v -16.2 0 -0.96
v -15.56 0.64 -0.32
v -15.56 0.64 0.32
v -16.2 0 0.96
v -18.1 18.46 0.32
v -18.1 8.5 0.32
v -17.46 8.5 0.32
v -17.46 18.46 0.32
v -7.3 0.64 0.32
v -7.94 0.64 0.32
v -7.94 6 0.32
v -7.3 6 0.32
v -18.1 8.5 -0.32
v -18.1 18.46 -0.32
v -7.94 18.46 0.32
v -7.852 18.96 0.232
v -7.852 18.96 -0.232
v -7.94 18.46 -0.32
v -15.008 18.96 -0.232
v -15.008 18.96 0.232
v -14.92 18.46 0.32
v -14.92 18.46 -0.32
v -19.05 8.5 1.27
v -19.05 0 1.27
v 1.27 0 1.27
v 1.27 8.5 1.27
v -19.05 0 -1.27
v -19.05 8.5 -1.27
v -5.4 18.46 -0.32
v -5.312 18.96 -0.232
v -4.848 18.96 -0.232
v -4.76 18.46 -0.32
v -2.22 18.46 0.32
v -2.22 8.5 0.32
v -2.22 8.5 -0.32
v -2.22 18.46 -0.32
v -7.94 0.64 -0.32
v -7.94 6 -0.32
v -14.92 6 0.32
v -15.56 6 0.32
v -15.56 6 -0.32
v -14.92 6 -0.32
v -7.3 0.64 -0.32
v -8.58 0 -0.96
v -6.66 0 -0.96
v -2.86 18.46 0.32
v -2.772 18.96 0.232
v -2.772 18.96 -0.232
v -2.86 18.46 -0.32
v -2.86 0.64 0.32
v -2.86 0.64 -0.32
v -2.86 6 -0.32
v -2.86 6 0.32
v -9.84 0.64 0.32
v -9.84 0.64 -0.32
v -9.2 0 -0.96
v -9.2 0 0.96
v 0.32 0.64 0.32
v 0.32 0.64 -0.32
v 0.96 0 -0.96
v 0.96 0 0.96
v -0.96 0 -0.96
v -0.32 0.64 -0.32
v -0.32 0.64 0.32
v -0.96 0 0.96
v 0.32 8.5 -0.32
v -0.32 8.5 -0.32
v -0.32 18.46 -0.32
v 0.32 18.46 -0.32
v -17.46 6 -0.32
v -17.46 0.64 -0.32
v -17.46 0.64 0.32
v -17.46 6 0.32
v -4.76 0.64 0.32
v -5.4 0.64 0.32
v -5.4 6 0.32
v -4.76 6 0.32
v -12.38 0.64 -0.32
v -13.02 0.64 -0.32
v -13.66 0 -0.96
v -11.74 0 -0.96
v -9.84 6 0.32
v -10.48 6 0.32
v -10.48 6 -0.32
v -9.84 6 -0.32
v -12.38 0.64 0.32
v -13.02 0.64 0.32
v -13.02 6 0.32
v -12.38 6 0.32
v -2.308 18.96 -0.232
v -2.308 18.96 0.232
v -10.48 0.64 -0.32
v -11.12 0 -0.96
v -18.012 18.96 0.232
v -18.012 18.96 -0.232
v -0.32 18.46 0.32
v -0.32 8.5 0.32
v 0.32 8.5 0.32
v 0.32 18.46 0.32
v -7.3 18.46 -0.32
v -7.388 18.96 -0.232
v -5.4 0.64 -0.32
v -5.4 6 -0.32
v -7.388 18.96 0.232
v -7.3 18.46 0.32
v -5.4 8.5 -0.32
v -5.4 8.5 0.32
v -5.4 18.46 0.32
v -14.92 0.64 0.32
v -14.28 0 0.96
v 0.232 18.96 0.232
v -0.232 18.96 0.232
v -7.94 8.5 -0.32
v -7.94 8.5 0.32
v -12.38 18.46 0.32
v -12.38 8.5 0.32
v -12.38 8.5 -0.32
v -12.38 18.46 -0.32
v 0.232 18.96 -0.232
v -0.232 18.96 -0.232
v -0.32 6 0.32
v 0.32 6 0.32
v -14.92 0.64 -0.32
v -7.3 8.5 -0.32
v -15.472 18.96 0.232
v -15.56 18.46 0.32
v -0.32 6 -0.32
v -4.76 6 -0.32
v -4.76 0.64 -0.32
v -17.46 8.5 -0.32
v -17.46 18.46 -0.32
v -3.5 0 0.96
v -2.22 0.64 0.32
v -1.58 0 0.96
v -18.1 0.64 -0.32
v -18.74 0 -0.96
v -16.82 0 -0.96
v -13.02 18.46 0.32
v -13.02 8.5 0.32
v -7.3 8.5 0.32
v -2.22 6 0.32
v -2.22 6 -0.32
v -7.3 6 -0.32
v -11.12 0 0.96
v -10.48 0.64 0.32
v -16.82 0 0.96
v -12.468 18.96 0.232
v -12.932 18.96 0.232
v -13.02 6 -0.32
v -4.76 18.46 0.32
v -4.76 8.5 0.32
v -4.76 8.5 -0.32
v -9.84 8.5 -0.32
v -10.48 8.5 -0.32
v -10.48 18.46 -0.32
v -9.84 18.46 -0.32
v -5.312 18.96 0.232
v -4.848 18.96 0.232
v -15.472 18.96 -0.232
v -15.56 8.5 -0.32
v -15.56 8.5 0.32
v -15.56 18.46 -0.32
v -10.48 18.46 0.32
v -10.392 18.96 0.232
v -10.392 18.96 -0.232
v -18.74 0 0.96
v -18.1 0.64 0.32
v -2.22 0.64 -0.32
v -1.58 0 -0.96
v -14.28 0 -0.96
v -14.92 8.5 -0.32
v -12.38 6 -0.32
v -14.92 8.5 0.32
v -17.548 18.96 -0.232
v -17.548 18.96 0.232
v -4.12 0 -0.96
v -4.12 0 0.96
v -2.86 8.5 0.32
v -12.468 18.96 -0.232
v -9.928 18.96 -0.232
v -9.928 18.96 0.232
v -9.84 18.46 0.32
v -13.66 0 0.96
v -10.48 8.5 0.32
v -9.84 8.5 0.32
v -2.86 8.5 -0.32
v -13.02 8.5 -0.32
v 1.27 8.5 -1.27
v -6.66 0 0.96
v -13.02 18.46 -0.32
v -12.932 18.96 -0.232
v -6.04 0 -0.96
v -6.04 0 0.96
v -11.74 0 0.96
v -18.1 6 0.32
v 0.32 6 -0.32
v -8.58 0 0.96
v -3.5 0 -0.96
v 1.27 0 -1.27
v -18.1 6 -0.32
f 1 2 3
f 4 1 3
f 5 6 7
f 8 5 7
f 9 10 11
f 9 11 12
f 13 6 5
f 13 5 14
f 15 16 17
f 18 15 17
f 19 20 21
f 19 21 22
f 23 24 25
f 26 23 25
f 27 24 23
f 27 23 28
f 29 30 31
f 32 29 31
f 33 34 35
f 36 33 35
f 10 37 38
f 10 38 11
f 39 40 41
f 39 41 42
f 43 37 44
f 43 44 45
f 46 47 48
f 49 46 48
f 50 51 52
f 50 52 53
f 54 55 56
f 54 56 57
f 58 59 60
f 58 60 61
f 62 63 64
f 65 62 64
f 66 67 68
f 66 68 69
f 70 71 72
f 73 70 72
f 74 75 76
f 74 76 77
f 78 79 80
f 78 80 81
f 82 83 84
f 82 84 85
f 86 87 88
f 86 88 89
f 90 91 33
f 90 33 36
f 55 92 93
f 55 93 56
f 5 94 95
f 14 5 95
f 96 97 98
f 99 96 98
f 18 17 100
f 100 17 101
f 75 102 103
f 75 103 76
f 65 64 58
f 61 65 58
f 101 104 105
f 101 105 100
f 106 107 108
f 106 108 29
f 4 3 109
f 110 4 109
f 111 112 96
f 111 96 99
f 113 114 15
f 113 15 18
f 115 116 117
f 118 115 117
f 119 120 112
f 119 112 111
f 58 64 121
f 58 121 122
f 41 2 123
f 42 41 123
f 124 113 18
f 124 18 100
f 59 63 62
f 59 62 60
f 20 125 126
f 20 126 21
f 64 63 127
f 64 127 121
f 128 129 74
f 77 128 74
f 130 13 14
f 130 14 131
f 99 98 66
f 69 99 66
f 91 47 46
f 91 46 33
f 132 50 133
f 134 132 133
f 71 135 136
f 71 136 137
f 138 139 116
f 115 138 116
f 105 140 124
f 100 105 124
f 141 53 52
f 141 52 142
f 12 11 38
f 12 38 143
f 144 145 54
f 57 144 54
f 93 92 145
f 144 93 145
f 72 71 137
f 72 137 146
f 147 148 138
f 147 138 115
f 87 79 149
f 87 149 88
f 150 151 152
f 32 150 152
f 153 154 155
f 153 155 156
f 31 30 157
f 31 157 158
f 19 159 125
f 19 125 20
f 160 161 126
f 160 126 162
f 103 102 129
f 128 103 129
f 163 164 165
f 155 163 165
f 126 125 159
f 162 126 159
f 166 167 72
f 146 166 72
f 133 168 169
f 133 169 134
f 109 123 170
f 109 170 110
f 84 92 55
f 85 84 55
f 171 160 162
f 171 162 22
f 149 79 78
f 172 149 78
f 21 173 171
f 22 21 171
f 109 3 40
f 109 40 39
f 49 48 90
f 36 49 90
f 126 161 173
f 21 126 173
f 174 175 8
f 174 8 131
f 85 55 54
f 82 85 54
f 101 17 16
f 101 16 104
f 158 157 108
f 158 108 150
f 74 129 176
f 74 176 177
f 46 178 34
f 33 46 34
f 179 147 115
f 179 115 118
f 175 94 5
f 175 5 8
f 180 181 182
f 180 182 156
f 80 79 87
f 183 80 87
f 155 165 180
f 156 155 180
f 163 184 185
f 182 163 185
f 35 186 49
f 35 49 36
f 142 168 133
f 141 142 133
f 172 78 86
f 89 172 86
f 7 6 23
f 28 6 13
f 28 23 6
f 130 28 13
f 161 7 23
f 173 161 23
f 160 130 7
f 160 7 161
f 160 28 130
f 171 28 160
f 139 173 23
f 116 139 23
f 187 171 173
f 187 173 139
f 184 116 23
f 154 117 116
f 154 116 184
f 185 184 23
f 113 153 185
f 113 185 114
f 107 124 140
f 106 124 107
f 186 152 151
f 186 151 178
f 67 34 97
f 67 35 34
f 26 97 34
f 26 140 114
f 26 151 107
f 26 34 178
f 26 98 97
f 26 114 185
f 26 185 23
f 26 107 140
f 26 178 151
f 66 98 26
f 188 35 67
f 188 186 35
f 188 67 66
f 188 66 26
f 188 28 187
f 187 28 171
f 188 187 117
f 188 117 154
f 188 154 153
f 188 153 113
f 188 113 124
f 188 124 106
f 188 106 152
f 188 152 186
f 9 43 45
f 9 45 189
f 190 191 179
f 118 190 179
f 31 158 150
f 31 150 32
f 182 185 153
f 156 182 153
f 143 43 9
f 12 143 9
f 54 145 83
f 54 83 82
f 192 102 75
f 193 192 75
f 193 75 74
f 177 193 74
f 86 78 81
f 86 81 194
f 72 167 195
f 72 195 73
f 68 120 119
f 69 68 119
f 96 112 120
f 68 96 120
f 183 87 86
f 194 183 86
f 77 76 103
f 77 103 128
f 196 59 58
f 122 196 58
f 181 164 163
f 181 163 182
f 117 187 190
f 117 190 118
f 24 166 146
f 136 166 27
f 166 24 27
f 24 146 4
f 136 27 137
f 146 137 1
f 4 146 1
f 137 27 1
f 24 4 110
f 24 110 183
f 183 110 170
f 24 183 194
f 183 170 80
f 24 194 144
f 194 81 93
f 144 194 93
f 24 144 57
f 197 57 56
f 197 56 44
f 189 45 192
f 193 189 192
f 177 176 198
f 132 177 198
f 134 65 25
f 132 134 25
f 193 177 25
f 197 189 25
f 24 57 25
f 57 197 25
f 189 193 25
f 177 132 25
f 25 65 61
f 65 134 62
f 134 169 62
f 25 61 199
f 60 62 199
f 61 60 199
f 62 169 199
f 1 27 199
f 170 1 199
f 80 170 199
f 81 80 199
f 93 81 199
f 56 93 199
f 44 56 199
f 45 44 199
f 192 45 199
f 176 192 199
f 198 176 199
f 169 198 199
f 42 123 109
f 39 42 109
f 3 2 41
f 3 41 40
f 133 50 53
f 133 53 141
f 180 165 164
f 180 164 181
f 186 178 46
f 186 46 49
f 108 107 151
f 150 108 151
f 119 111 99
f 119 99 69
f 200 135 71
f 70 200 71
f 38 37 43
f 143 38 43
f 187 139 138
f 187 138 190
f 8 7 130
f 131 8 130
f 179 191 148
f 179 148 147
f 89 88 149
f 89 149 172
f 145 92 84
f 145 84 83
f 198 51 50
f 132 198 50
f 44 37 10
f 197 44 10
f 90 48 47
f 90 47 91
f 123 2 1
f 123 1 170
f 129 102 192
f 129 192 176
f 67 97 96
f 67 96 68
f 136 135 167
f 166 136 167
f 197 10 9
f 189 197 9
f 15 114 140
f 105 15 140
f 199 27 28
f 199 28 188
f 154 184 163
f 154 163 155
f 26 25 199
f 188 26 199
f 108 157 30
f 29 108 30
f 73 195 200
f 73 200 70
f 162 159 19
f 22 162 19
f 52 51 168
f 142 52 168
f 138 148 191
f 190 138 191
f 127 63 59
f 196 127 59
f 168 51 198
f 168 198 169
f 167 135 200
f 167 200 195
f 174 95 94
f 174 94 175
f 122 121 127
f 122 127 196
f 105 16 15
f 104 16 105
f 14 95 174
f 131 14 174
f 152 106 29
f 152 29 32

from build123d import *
from OCP.BRepFilletAPI import BRepFilletAPI_MakeChamfer

# Parameters (mm, degrees)
SKETCH1_W                   = 2.54
SKETCH1_H                   = 2.54
BOSS_EXTRUDE1_DEPTH         = 8.5
SKETCH2_W                   = 0.64
SKETCH2_H                   = 0.64
BOSS_EXTRUDE2_DEPTH         = 18.9595482
CHAMFER1_SIZE               = 0.5
CHAMFER1_SIZE2              = 0.08816349
SKETCH3_W                   = 0.64
SKETCH3_H                   = 0.64
CUT_EXTRUDE1_DEPTH          = 6
CHAMFER2_SIZE               = 0.64
LPATTERN1_COUNT             = 8
LPATTERN1_PITCH             = 2.54
CHAMFER1_OF_LPATTERN1_SIZE  = 0.5
CHAMFER1_OF_LPATTERN1_SIZE2 = 0.08816349
CHAMFER2_OF_LPATTERN1_SIZE  = 0.64


with BuildPart() as part:
    # Sketch1 → Boss-Extrude1 (new body)
    with BuildSketch(Plane(origin=(0, 0, 0), x_dir=(1, 0, 0), z_dir=(0, 1, 0))):
        Rectangle(SKETCH1_W, SKETCH1_H)
    boss_extrude1 = extrude(amount=BOSS_EXTRUDE1_DEPTH)

    # Sketch2 → Boss-Extrude2 (add)
    with BuildSketch(Plane(origin=(0, 0, 0), x_dir=(1, 0, 0), z_dir=(0, 1, 0))):
        Rectangle(SKETCH2_W, SKETCH2_H)
    boss_extrude2 = extrude(amount=BOSS_EXTRUDE2_DEPTH)

    # Chamfer1: one chamfer whose edges measure the first distance from different faces: ONE call of the kernel's chamfer builder (chamfer() names one face for all edges)
    chamfer1_edges_1 = [part.edges().sort_by_distance(p)[0] for p in [
        (-0.32, 18.9595482, 0),
    ]]
    chamfer1_side_1 = [part.faces().sort_by_distance(p)[0] for p in [
        (-0.32, 13.7297741, 0),
    ]]
    chamfer1_edges_2 = [part.edges().sort_by_distance(p)[0] for p in [
        (0, 18.9595482, 0.32),
    ]]
    chamfer1_side_2 = [part.faces().sort_by_distance(p)[0] for p in [
        (0, 13.7297741, 0.32),
    ]]
    chamfer1_edges_3 = [part.edges().sort_by_distance(p)[0] for p in [
        (0.32, 18.9595482, 0),
    ]]
    chamfer1_side_3 = [part.faces().sort_by_distance(p)[0] for p in [
        (0.32, 13.7297741, 0),
    ]]
    chamfer1_edges_4 = [part.edges().sort_by_distance(p)[0] for p in [
        (0, 18.9595482, -0.32),
    ]]
    chamfer1_side_4 = [part.faces().sort_by_distance(p)[0] for p in [
        (0, 13.7297741, -0.32),
    ]]
    chamfer1 = BRepFilletAPI_MakeChamfer(part.part.solid().wrapped)
    for e in chamfer1_edges_1:
        chamfer1.Add(CHAMFER1_SIZE, CHAMFER1_SIZE2, e.wrapped, chamfer1_side_1[0].wrapped)  # the first distance lies on this face
    for e in chamfer1_edges_2:
        chamfer1.Add(CHAMFER1_SIZE, CHAMFER1_SIZE2, e.wrapped, chamfer1_side_2[0].wrapped)  # the first distance lies on this face
    for e in chamfer1_edges_3:
        chamfer1.Add(CHAMFER1_SIZE, CHAMFER1_SIZE2, e.wrapped, chamfer1_side_3[0].wrapped)  # the first distance lies on this face
    for e in chamfer1_edges_4:
        chamfer1.Add(CHAMFER1_SIZE, CHAMFER1_SIZE2, e.wrapped, chamfer1_side_4[0].wrapped)  # the first distance lies on this face
    add(Compound.cast(chamfer1.Shape()), mode=Mode.REPLACE)

    # Sketch3 → Cut-Extrude1 (cut)
    with BuildSketch(Plane.XZ):
        Rectangle(SKETCH3_W, SKETCH3_H)
    cut_extrude1 = extrude(amount=-CUT_EXTRUDE1_DEPTH, mode=Mode.SUBTRACT)

    # Chamfer2
    chamfer2_edges = [part.edges().sort_by_distance(p)[0] for p in [
        (-0.32, 0, 0),
        (0, 0, -0.32),
        (0.32, 0, 0),
        (0, 0, 0.32),
    ]]
    chamfer(chamfer2_edges, length=CHAMFER2_SIZE)

    # LPattern1: Boss-Extrude1, Boss-Extrude2, Cut-Extrude1 ×8
    with Locations(*[(-i * LPATTERN1_PITCH, 0, 0) for i in range(1, LPATTERN1_COUNT)]):
        add(boss_extrude1)
        add(boss_extrude2)
        add(cut_extrude1, mode=Mode.SUBTRACT)

    # Chamfer1 of LPattern1: one chamfer whose edges measure the first distance from different faces: ONE call of the kernel's chamfer builder (chamfer() names one face for all edges)
    chamfer1_of_lpattern1_edges_1 = [part.edges().sort_by_distance(p)[0] for p in [
        (-2.86, 18.9595482, 0),
    ]]
    chamfer1_of_lpattern1_side_1 = [part.faces().sort_by_distance(p)[0] for p in [
        (-2.86, 13.7297741, 0),
    ]]
    chamfer1_of_lpattern1_edges_2 = [part.edges().sort_by_distance(p)[0] for p in [
        (-2.54, 18.9595482, 0.32),
    ]]
    chamfer1_of_lpattern1_side_2 = [part.faces().sort_by_distance(p)[0] for p in [
        (-2.54, 13.7297741, 0.32),
    ]]
    chamfer1_of_lpattern1_edges_3 = [part.edges().sort_by_distance(p)[0] for p in [
        (-2.22, 18.9595482, 0),
    ]]
    chamfer1_of_lpattern1_side_3 = [part.faces().sort_by_distance(p)[0] for p in [
        (-2.22, 13.7297741, 0),
    ]]
    chamfer1_of_lpattern1_edges_4 = [part.edges().sort_by_distance(p)[0] for p in [
        (-2.54, 18.9595482, -0.32),
    ]]
    chamfer1_of_lpattern1_side_4 = [part.faces().sort_by_distance(p)[0] for p in [
        (-2.54, 13.7297741, -0.32),
    ]]
    chamfer1_of_lpattern1_edges_5 = [part.edges().sort_by_distance(p)[0] for p in [
        (-5.4, 18.9595482, 0),
    ]]
    chamfer1_of_lpattern1_side_5 = [part.faces().sort_by_distance(p)[0] for p in [
        (-5.4, 13.7297741, 0),
    ]]
    chamfer1_of_lpattern1_edges_6 = [part.edges().sort_by_distance(p)[0] for p in [
        (-5.08, 18.9595482, 0.32),
    ]]
    chamfer1_of_lpattern1_side_6 = [part.faces().sort_by_distance(p)[0] for p in [
        (-5.08, 13.7297741, 0.32),
    ]]
    chamfer1_of_lpattern1_edges_7 = [part.edges().sort_by_distance(p)[0] for p in [
        (-4.76, 18.9595482, 0),
    ]]
    chamfer1_of_lpattern1_side_7 = [part.faces().sort_by_distance(p)[0] for p in [
        (-4.76, 13.7297741, 0),
    ]]
    chamfer1_of_lpattern1_edges_8 = [part.edges().sort_by_distance(p)[0] for p in [
        (-5.08, 18.9595482, -0.32),
    ]]
    chamfer1_of_lpattern1_side_8 = [part.faces().sort_by_distance(p)[0] for p in [
        (-5.08, 13.7297741, -0.32),
    ]]
    chamfer1_of_lpattern1_edges_9 = [part.edges().sort_by_distance(p)[0] for p in [
        (-7.94, 18.9595482, 0),
    ]]
    chamfer1_of_lpattern1_side_9 = [part.faces().sort_by_distance(p)[0] for p in [
        (-7.94, 13.7297741, 0),
    ]]
    chamfer1_of_lpattern1_edges_10 = [part.edges().sort_by_distance(p)[0] for p in [
        (-7.62, 18.9595482, 0.32),
    ]]
    chamfer1_of_lpattern1_side_10 = [part.faces().sort_by_distance(p)[0] for p in [
        (-7.62, 13.7297741, 0.32),
    ]]
    chamfer1_of_lpattern1_edges_11 = [part.edges().sort_by_distance(p)[0] for p in [
        (-7.3, 18.9595482, 0),
    ]]
    chamfer1_of_lpattern1_side_11 = [part.faces().sort_by_distance(p)[0] for p in [
        (-7.3, 13.7297741, 0),
    ]]
    chamfer1_of_lpattern1_edges_12 = [part.edges().sort_by_distance(p)[0] for p in [
        (-7.62, 18.9595482, -0.32),
    ]]
    chamfer1_of_lpattern1_side_12 = [part.faces().sort_by_distance(p)[0] for p in [
        (-7.62, 13.7297741, -0.32),
    ]]
    chamfer1_of_lpattern1_edges_13 = [part.edges().sort_by_distance(p)[0] for p in [
        (-10.48, 18.9595482, 0),
    ]]
    chamfer1_of_lpattern1_side_13 = [part.faces().sort_by_distance(p)[0] for p in [
        (-10.48, 13.7297741, 0),
    ]]
    chamfer1_of_lpattern1_edges_14 = [part.edges().sort_by_distance(p)[0] for p in [
        (-10.16, 18.9595482, 0.32),
    ]]
    chamfer1_of_lpattern1_side_14 = [part.faces().sort_by_distance(p)[0] for p in [
        (-10.16, 13.7297741, 0.32),
    ]]
    chamfer1_of_lpattern1_edges_15 = [part.edges().sort_by_distance(p)[0] for p in [
        (-9.84, 18.9595482, 0),
    ]]
    chamfer1_of_lpattern1_side_15 = [part.faces().sort_by_distance(p)[0] for p in [
        (-9.84, 13.7297741, 0),
    ]]
    chamfer1_of_lpattern1_edges_16 = [part.edges().sort_by_distance(p)[0] for p in [
        (-10.16, 18.9595482, -0.32),
    ]]
    chamfer1_of_lpattern1_side_16 = [part.faces().sort_by_distance(p)[0] for p in [
        (-10.16, 13.7297741, -0.32),
    ]]
    chamfer1_of_lpattern1_edges_17 = [part.edges().sort_by_distance(p)[0] for p in [
        (-13.02, 18.9595482, 0),
    ]]
    chamfer1_of_lpattern1_side_17 = [part.faces().sort_by_distance(p)[0] for p in [
        (-13.02, 13.7297741, 0),
    ]]
    chamfer1_of_lpattern1_edges_18 = [part.edges().sort_by_distance(p)[0] for p in [
        (-12.7, 18.9595482, 0.32),
    ]]
    chamfer1_of_lpattern1_side_18 = [part.faces().sort_by_distance(p)[0] for p in [
        (-12.7, 13.7297741, 0.32),
    ]]
    chamfer1_of_lpattern1_edges_19 = [part.edges().sort_by_distance(p)[0] for p in [
        (-12.38, 18.9595482, 0),
    ]]
    chamfer1_of_lpattern1_side_19 = [part.faces().sort_by_distance(p)[0] for p in [
        (-12.38, 13.7297741, 0),
    ]]
    chamfer1_of_lpattern1_edges_20 = [part.edges().sort_by_distance(p)[0] for p in [
        (-12.7, 18.9595482, -0.32),
    ]]
    chamfer1_of_lpattern1_side_20 = [part.faces().sort_by_distance(p)[0] for p in [
        (-12.7, 13.7297741, -0.32),
    ]]
    chamfer1_of_lpattern1_edges_21 = [part.edges().sort_by_distance(p)[0] for p in [
        (-15.56, 18.9595482, 0),
    ]]
    chamfer1_of_lpattern1_side_21 = [part.faces().sort_by_distance(p)[0] for p in [
        (-15.56, 13.7297741, 0),
    ]]
    chamfer1_of_lpattern1_edges_22 = [part.edges().sort_by_distance(p)[0] for p in [
        (-15.24, 18.9595482, 0.32),
    ]]
    chamfer1_of_lpattern1_side_22 = [part.faces().sort_by_distance(p)[0] for p in [
        (-15.24, 13.7297741, 0.32),
    ]]
    chamfer1_of_lpattern1_edges_23 = [part.edges().sort_by_distance(p)[0] for p in [
        (-14.92, 18.9595482, 0),
    ]]
    chamfer1_of_lpattern1_side_23 = [part.faces().sort_by_distance(p)[0] for p in [
        (-14.92, 13.7297741, 0),
    ]]
    chamfer1_of_lpattern1_edges_24 = [part.edges().sort_by_distance(p)[0] for p in [
        (-15.24, 18.9595482, -0.32),
    ]]
    chamfer1_of_lpattern1_side_24 = [part.faces().sort_by_distance(p)[0] for p in [
        (-15.24, 13.7297741, -0.32),
    ]]
    chamfer1_of_lpattern1_edges_25 = [part.edges().sort_by_distance(p)[0] for p in [
        (-18.1, 18.9595482, 0),
    ]]
    chamfer1_of_lpattern1_side_25 = [part.faces().sort_by_distance(p)[0] for p in [
        (-18.1, 13.7297741, 0),
    ]]
    chamfer1_of_lpattern1_edges_26 = [part.edges().sort_by_distance(p)[0] for p in [
        (-17.78, 18.9595482, 0.32),
    ]]
    chamfer1_of_lpattern1_side_26 = [part.faces().sort_by_distance(p)[0] for p in [
        (-17.78, 13.7297741, 0.32),
    ]]
    chamfer1_of_lpattern1_edges_27 = [part.edges().sort_by_distance(p)[0] for p in [
        (-17.46, 18.9595482, 0),
    ]]
    chamfer1_of_lpattern1_side_27 = [part.faces().sort_by_distance(p)[0] for p in [
        (-17.46, 13.7297741, 0),
    ]]
    chamfer1_of_lpattern1_edges_28 = [part.edges().sort_by_distance(p)[0] for p in [
        (-17.78, 18.9595482, -0.32),
    ]]
    chamfer1_of_lpattern1_side_28 = [part.faces().sort_by_distance(p)[0] for p in [
        (-17.78, 13.7297741, -0.32),
    ]]
    chamfer1_of_lpattern1 = BRepFilletAPI_MakeChamfer(part.part.solid().wrapped)
    for e in chamfer1_of_lpattern1_edges_1:
        chamfer1_of_lpattern1.Add(CHAMFER1_OF_LPATTERN1_SIZE, CHAMFER1_OF_LPATTERN1_SIZE2, e.wrapped, chamfer1_of_lpattern1_side_1[0].wrapped)  # the first distance lies on this face
    for e in chamfer1_of_lpattern1_edges_2:
        chamfer1_of_lpattern1.Add(CHAMFER1_OF_LPATTERN1_SIZE, CHAMFER1_OF_LPATTERN1_SIZE2, e.wrapped, chamfer1_of_lpattern1_side_2[0].wrapped)  # the first distance lies on this face
    for e in chamfer1_of_lpattern1_edges_3:
        chamfer1_of_lpattern1.Add(CHAMFER1_OF_LPATTERN1_SIZE, CHAMFER1_OF_LPATTERN1_SIZE2, e.wrapped, chamfer1_of_lpattern1_side_3[0].wrapped)  # the first distance lies on this face
    for e in chamfer1_of_lpattern1_edges_4:
        chamfer1_of_lpattern1.Add(CHAMFER1_OF_LPATTERN1_SIZE, CHAMFER1_OF_LPATTERN1_SIZE2, e.wrapped, chamfer1_of_lpattern1_side_4[0].wrapped)  # the first distance lies on this face
    for e in chamfer1_of_lpattern1_edges_5:
        chamfer1_of_lpattern1.Add(CHAMFER1_OF_LPATTERN1_SIZE, CHAMFER1_OF_LPATTERN1_SIZE2, e.wrapped, chamfer1_of_lpattern1_side_5[0].wrapped)  # the first distance lies on this face
    for e in chamfer1_of_lpattern1_edges_6:
        chamfer1_of_lpattern1.Add(CHAMFER1_OF_LPATTERN1_SIZE, CHAMFER1_OF_LPATTERN1_SIZE2, e.wrapped, chamfer1_of_lpattern1_side_6[0].wrapped)  # the first distance lies on this face
    for e in chamfer1_of_lpattern1_edges_7:
        chamfer1_of_lpattern1.Add(CHAMFER1_OF_LPATTERN1_SIZE, CHAMFER1_OF_LPATTERN1_SIZE2, e.wrapped, chamfer1_of_lpattern1_side_7[0].wrapped)  # the first distance lies on this face
    for e in chamfer1_of_lpattern1_edges_8:
        chamfer1_of_lpattern1.Add(CHAMFER1_OF_LPATTERN1_SIZE, CHAMFER1_OF_LPATTERN1_SIZE2, e.wrapped, chamfer1_of_lpattern1_side_8[0].wrapped)  # the first distance lies on this face
    for e in chamfer1_of_lpattern1_edges_9:
        chamfer1_of_lpattern1.Add(CHAMFER1_OF_LPATTERN1_SIZE, CHAMFER1_OF_LPATTERN1_SIZE2, e.wrapped, chamfer1_of_lpattern1_side_9[0].wrapped)  # the first distance lies on this face
    for e in chamfer1_of_lpattern1_edges_10:
        chamfer1_of_lpattern1.Add(CHAMFER1_OF_LPATTERN1_SIZE, CHAMFER1_OF_LPATTERN1_SIZE2, e.wrapped, chamfer1_of_lpattern1_side_10[0].wrapped)  # the first distance lies on this face
    for e in chamfer1_of_lpattern1_edges_11:
        chamfer1_of_lpattern1.Add(CHAMFER1_OF_LPATTERN1_SIZE, CHAMFER1_OF_LPATTERN1_SIZE2, e.wrapped, chamfer1_of_lpattern1_side_11[0].wrapped)  # the first distance lies on this face
    for e in chamfer1_of_lpattern1_edges_12:
        chamfer1_of_lpattern1.Add(CHAMFER1_OF_LPATTERN1_SIZE, CHAMFER1_OF_LPATTERN1_SIZE2, e.wrapped, chamfer1_of_lpattern1_side_12[0].wrapped)  # the first distance lies on this face
    for e in chamfer1_of_lpattern1_edges_13:
        chamfer1_of_lpattern1.Add(CHAMFER1_OF_LPATTERN1_SIZE, CHAMFER1_OF_LPATTERN1_SIZE2, e.wrapped, chamfer1_of_lpattern1_side_13[0].wrapped)  # the first distance lies on this face
    for e in chamfer1_of_lpattern1_edges_14:
        chamfer1_of_lpattern1.Add(CHAMFER1_OF_LPATTERN1_SIZE, CHAMFER1_OF_LPATTERN1_SIZE2, e.wrapped, chamfer1_of_lpattern1_side_14[0].wrapped)  # the first distance lies on this face
    for e in chamfer1_of_lpattern1_edges_15:
        chamfer1_of_lpattern1.Add(CHAMFER1_OF_LPATTERN1_SIZE, CHAMFER1_OF_LPATTERN1_SIZE2, e.wrapped, chamfer1_of_lpattern1_side_15[0].wrapped)  # the first distance lies on this face
    for e in chamfer1_of_lpattern1_edges_16:
        chamfer1_of_lpattern1.Add(CHAMFER1_OF_LPATTERN1_SIZE, CHAMFER1_OF_LPATTERN1_SIZE2, e.wrapped, chamfer1_of_lpattern1_side_16[0].wrapped)  # the first distance lies on this face
    for e in chamfer1_of_lpattern1_edges_17:
        chamfer1_of_lpattern1.Add(CHAMFER1_OF_LPATTERN1_SIZE, CHAMFER1_OF_LPATTERN1_SIZE2, e.wrapped, chamfer1_of_lpattern1_side_17[0].wrapped)  # the first distance lies on this face
    for e in chamfer1_of_lpattern1_edges_18:
        chamfer1_of_lpattern1.Add(CHAMFER1_OF_LPATTERN1_SIZE, CHAMFER1_OF_LPATTERN1_SIZE2, e.wrapped, chamfer1_of_lpattern1_side_18[0].wrapped)  # the first distance lies on this face
    for e in chamfer1_of_lpattern1_edges_19:
        chamfer1_of_lpattern1.Add(CHAMFER1_OF_LPATTERN1_SIZE, CHAMFER1_OF_LPATTERN1_SIZE2, e.wrapped, chamfer1_of_lpattern1_side_19[0].wrapped)  # the first distance lies on this face
    for e in chamfer1_of_lpattern1_edges_20:
        chamfer1_of_lpattern1.Add(CHAMFER1_OF_LPATTERN1_SIZE, CHAMFER1_OF_LPATTERN1_SIZE2, e.wrapped, chamfer1_of_lpattern1_side_20[0].wrapped)  # the first distance lies on this face
    for e in chamfer1_of_lpattern1_edges_21:
        chamfer1_of_lpattern1.Add(CHAMFER1_OF_LPATTERN1_SIZE, CHAMFER1_OF_LPATTERN1_SIZE2, e.wrapped, chamfer1_of_lpattern1_side_21[0].wrapped)  # the first distance lies on this face
    for e in chamfer1_of_lpattern1_edges_22:
        chamfer1_of_lpattern1.Add(CHAMFER1_OF_LPATTERN1_SIZE, CHAMFER1_OF_LPATTERN1_SIZE2, e.wrapped, chamfer1_of_lpattern1_side_22[0].wrapped)  # the first distance lies on this face
    for e in chamfer1_of_lpattern1_edges_23:
        chamfer1_of_lpattern1.Add(CHAMFER1_OF_LPATTERN1_SIZE, CHAMFER1_OF_LPATTERN1_SIZE2, e.wrapped, chamfer1_of_lpattern1_side_23[0].wrapped)  # the first distance lies on this face
    for e in chamfer1_of_lpattern1_edges_24:
        chamfer1_of_lpattern1.Add(CHAMFER1_OF_LPATTERN1_SIZE, CHAMFER1_OF_LPATTERN1_SIZE2, e.wrapped, chamfer1_of_lpattern1_side_24[0].wrapped)  # the first distance lies on this face
    for e in chamfer1_of_lpattern1_edges_25:
        chamfer1_of_lpattern1.Add(CHAMFER1_OF_LPATTERN1_SIZE, CHAMFER1_OF_LPATTERN1_SIZE2, e.wrapped, chamfer1_of_lpattern1_side_25[0].wrapped)  # the first distance lies on this face
    for e in chamfer1_of_lpattern1_edges_26:
        chamfer1_of_lpattern1.Add(CHAMFER1_OF_LPATTERN1_SIZE, CHAMFER1_OF_LPATTERN1_SIZE2, e.wrapped, chamfer1_of_lpattern1_side_26[0].wrapped)  # the first distance lies on this face
    for e in chamfer1_of_lpattern1_edges_27:
        chamfer1_of_lpattern1.Add(CHAMFER1_OF_LPATTERN1_SIZE, CHAMFER1_OF_LPATTERN1_SIZE2, e.wrapped, chamfer1_of_lpattern1_side_27[0].wrapped)  # the first distance lies on this face
    for e in chamfer1_of_lpattern1_edges_28:
        chamfer1_of_lpattern1.Add(CHAMFER1_OF_LPATTERN1_SIZE, CHAMFER1_OF_LPATTERN1_SIZE2, e.wrapped, chamfer1_of_lpattern1_side_28[0].wrapped)  # the first distance lies on this face
    add(Compound.cast(chamfer1_of_lpattern1.Shape()), mode=Mode.REPLACE)

    # Chamfer2 of LPattern1
    chamfer2_of_lpattern1_edges = [part.edges().sort_by_distance(p)[0] for p in [
        (-2.86, 0, 0),
        (-2.54, 0, -0.32),
        (-2.22, 0, 0),
        (-2.54, 0, 0.32),
        (-5.4, 0, 0),
        (-5.08, 0, -0.32),
        (-4.76, 0, 0),
        (-5.08, 0, 0.32),
        (-7.94, 0, 0),
        (-7.62, 0, -0.32),
        (-7.3, 0, 0),
        (-7.62, 0, 0.32),
        (-10.48, 0, 0),
        (-10.16, 0, -0.32),
        (-9.84, 0, 0),
        (-10.16, 0, 0.32),
        (-13.02, 0, 0),
        (-12.7, 0, -0.32),
        (-12.38, 0, 0),
        (-12.7, 0, 0.32),
        (-15.56, 0, 0),
        (-15.24, 0, -0.32),
        (-14.92, 0, 0),
        (-15.24, 0, 0.32),
        (-18.1, 0, 0),
        (-17.78, 0, -0.32),
        (-17.46, 0, 0),
        (-17.78, 0, 0.32),
    ]]
    chamfer(chamfer2_of_lpattern1_edges, length=CHAMFER2_OF_LPATTERN1_SIZE)


solid = part.part
